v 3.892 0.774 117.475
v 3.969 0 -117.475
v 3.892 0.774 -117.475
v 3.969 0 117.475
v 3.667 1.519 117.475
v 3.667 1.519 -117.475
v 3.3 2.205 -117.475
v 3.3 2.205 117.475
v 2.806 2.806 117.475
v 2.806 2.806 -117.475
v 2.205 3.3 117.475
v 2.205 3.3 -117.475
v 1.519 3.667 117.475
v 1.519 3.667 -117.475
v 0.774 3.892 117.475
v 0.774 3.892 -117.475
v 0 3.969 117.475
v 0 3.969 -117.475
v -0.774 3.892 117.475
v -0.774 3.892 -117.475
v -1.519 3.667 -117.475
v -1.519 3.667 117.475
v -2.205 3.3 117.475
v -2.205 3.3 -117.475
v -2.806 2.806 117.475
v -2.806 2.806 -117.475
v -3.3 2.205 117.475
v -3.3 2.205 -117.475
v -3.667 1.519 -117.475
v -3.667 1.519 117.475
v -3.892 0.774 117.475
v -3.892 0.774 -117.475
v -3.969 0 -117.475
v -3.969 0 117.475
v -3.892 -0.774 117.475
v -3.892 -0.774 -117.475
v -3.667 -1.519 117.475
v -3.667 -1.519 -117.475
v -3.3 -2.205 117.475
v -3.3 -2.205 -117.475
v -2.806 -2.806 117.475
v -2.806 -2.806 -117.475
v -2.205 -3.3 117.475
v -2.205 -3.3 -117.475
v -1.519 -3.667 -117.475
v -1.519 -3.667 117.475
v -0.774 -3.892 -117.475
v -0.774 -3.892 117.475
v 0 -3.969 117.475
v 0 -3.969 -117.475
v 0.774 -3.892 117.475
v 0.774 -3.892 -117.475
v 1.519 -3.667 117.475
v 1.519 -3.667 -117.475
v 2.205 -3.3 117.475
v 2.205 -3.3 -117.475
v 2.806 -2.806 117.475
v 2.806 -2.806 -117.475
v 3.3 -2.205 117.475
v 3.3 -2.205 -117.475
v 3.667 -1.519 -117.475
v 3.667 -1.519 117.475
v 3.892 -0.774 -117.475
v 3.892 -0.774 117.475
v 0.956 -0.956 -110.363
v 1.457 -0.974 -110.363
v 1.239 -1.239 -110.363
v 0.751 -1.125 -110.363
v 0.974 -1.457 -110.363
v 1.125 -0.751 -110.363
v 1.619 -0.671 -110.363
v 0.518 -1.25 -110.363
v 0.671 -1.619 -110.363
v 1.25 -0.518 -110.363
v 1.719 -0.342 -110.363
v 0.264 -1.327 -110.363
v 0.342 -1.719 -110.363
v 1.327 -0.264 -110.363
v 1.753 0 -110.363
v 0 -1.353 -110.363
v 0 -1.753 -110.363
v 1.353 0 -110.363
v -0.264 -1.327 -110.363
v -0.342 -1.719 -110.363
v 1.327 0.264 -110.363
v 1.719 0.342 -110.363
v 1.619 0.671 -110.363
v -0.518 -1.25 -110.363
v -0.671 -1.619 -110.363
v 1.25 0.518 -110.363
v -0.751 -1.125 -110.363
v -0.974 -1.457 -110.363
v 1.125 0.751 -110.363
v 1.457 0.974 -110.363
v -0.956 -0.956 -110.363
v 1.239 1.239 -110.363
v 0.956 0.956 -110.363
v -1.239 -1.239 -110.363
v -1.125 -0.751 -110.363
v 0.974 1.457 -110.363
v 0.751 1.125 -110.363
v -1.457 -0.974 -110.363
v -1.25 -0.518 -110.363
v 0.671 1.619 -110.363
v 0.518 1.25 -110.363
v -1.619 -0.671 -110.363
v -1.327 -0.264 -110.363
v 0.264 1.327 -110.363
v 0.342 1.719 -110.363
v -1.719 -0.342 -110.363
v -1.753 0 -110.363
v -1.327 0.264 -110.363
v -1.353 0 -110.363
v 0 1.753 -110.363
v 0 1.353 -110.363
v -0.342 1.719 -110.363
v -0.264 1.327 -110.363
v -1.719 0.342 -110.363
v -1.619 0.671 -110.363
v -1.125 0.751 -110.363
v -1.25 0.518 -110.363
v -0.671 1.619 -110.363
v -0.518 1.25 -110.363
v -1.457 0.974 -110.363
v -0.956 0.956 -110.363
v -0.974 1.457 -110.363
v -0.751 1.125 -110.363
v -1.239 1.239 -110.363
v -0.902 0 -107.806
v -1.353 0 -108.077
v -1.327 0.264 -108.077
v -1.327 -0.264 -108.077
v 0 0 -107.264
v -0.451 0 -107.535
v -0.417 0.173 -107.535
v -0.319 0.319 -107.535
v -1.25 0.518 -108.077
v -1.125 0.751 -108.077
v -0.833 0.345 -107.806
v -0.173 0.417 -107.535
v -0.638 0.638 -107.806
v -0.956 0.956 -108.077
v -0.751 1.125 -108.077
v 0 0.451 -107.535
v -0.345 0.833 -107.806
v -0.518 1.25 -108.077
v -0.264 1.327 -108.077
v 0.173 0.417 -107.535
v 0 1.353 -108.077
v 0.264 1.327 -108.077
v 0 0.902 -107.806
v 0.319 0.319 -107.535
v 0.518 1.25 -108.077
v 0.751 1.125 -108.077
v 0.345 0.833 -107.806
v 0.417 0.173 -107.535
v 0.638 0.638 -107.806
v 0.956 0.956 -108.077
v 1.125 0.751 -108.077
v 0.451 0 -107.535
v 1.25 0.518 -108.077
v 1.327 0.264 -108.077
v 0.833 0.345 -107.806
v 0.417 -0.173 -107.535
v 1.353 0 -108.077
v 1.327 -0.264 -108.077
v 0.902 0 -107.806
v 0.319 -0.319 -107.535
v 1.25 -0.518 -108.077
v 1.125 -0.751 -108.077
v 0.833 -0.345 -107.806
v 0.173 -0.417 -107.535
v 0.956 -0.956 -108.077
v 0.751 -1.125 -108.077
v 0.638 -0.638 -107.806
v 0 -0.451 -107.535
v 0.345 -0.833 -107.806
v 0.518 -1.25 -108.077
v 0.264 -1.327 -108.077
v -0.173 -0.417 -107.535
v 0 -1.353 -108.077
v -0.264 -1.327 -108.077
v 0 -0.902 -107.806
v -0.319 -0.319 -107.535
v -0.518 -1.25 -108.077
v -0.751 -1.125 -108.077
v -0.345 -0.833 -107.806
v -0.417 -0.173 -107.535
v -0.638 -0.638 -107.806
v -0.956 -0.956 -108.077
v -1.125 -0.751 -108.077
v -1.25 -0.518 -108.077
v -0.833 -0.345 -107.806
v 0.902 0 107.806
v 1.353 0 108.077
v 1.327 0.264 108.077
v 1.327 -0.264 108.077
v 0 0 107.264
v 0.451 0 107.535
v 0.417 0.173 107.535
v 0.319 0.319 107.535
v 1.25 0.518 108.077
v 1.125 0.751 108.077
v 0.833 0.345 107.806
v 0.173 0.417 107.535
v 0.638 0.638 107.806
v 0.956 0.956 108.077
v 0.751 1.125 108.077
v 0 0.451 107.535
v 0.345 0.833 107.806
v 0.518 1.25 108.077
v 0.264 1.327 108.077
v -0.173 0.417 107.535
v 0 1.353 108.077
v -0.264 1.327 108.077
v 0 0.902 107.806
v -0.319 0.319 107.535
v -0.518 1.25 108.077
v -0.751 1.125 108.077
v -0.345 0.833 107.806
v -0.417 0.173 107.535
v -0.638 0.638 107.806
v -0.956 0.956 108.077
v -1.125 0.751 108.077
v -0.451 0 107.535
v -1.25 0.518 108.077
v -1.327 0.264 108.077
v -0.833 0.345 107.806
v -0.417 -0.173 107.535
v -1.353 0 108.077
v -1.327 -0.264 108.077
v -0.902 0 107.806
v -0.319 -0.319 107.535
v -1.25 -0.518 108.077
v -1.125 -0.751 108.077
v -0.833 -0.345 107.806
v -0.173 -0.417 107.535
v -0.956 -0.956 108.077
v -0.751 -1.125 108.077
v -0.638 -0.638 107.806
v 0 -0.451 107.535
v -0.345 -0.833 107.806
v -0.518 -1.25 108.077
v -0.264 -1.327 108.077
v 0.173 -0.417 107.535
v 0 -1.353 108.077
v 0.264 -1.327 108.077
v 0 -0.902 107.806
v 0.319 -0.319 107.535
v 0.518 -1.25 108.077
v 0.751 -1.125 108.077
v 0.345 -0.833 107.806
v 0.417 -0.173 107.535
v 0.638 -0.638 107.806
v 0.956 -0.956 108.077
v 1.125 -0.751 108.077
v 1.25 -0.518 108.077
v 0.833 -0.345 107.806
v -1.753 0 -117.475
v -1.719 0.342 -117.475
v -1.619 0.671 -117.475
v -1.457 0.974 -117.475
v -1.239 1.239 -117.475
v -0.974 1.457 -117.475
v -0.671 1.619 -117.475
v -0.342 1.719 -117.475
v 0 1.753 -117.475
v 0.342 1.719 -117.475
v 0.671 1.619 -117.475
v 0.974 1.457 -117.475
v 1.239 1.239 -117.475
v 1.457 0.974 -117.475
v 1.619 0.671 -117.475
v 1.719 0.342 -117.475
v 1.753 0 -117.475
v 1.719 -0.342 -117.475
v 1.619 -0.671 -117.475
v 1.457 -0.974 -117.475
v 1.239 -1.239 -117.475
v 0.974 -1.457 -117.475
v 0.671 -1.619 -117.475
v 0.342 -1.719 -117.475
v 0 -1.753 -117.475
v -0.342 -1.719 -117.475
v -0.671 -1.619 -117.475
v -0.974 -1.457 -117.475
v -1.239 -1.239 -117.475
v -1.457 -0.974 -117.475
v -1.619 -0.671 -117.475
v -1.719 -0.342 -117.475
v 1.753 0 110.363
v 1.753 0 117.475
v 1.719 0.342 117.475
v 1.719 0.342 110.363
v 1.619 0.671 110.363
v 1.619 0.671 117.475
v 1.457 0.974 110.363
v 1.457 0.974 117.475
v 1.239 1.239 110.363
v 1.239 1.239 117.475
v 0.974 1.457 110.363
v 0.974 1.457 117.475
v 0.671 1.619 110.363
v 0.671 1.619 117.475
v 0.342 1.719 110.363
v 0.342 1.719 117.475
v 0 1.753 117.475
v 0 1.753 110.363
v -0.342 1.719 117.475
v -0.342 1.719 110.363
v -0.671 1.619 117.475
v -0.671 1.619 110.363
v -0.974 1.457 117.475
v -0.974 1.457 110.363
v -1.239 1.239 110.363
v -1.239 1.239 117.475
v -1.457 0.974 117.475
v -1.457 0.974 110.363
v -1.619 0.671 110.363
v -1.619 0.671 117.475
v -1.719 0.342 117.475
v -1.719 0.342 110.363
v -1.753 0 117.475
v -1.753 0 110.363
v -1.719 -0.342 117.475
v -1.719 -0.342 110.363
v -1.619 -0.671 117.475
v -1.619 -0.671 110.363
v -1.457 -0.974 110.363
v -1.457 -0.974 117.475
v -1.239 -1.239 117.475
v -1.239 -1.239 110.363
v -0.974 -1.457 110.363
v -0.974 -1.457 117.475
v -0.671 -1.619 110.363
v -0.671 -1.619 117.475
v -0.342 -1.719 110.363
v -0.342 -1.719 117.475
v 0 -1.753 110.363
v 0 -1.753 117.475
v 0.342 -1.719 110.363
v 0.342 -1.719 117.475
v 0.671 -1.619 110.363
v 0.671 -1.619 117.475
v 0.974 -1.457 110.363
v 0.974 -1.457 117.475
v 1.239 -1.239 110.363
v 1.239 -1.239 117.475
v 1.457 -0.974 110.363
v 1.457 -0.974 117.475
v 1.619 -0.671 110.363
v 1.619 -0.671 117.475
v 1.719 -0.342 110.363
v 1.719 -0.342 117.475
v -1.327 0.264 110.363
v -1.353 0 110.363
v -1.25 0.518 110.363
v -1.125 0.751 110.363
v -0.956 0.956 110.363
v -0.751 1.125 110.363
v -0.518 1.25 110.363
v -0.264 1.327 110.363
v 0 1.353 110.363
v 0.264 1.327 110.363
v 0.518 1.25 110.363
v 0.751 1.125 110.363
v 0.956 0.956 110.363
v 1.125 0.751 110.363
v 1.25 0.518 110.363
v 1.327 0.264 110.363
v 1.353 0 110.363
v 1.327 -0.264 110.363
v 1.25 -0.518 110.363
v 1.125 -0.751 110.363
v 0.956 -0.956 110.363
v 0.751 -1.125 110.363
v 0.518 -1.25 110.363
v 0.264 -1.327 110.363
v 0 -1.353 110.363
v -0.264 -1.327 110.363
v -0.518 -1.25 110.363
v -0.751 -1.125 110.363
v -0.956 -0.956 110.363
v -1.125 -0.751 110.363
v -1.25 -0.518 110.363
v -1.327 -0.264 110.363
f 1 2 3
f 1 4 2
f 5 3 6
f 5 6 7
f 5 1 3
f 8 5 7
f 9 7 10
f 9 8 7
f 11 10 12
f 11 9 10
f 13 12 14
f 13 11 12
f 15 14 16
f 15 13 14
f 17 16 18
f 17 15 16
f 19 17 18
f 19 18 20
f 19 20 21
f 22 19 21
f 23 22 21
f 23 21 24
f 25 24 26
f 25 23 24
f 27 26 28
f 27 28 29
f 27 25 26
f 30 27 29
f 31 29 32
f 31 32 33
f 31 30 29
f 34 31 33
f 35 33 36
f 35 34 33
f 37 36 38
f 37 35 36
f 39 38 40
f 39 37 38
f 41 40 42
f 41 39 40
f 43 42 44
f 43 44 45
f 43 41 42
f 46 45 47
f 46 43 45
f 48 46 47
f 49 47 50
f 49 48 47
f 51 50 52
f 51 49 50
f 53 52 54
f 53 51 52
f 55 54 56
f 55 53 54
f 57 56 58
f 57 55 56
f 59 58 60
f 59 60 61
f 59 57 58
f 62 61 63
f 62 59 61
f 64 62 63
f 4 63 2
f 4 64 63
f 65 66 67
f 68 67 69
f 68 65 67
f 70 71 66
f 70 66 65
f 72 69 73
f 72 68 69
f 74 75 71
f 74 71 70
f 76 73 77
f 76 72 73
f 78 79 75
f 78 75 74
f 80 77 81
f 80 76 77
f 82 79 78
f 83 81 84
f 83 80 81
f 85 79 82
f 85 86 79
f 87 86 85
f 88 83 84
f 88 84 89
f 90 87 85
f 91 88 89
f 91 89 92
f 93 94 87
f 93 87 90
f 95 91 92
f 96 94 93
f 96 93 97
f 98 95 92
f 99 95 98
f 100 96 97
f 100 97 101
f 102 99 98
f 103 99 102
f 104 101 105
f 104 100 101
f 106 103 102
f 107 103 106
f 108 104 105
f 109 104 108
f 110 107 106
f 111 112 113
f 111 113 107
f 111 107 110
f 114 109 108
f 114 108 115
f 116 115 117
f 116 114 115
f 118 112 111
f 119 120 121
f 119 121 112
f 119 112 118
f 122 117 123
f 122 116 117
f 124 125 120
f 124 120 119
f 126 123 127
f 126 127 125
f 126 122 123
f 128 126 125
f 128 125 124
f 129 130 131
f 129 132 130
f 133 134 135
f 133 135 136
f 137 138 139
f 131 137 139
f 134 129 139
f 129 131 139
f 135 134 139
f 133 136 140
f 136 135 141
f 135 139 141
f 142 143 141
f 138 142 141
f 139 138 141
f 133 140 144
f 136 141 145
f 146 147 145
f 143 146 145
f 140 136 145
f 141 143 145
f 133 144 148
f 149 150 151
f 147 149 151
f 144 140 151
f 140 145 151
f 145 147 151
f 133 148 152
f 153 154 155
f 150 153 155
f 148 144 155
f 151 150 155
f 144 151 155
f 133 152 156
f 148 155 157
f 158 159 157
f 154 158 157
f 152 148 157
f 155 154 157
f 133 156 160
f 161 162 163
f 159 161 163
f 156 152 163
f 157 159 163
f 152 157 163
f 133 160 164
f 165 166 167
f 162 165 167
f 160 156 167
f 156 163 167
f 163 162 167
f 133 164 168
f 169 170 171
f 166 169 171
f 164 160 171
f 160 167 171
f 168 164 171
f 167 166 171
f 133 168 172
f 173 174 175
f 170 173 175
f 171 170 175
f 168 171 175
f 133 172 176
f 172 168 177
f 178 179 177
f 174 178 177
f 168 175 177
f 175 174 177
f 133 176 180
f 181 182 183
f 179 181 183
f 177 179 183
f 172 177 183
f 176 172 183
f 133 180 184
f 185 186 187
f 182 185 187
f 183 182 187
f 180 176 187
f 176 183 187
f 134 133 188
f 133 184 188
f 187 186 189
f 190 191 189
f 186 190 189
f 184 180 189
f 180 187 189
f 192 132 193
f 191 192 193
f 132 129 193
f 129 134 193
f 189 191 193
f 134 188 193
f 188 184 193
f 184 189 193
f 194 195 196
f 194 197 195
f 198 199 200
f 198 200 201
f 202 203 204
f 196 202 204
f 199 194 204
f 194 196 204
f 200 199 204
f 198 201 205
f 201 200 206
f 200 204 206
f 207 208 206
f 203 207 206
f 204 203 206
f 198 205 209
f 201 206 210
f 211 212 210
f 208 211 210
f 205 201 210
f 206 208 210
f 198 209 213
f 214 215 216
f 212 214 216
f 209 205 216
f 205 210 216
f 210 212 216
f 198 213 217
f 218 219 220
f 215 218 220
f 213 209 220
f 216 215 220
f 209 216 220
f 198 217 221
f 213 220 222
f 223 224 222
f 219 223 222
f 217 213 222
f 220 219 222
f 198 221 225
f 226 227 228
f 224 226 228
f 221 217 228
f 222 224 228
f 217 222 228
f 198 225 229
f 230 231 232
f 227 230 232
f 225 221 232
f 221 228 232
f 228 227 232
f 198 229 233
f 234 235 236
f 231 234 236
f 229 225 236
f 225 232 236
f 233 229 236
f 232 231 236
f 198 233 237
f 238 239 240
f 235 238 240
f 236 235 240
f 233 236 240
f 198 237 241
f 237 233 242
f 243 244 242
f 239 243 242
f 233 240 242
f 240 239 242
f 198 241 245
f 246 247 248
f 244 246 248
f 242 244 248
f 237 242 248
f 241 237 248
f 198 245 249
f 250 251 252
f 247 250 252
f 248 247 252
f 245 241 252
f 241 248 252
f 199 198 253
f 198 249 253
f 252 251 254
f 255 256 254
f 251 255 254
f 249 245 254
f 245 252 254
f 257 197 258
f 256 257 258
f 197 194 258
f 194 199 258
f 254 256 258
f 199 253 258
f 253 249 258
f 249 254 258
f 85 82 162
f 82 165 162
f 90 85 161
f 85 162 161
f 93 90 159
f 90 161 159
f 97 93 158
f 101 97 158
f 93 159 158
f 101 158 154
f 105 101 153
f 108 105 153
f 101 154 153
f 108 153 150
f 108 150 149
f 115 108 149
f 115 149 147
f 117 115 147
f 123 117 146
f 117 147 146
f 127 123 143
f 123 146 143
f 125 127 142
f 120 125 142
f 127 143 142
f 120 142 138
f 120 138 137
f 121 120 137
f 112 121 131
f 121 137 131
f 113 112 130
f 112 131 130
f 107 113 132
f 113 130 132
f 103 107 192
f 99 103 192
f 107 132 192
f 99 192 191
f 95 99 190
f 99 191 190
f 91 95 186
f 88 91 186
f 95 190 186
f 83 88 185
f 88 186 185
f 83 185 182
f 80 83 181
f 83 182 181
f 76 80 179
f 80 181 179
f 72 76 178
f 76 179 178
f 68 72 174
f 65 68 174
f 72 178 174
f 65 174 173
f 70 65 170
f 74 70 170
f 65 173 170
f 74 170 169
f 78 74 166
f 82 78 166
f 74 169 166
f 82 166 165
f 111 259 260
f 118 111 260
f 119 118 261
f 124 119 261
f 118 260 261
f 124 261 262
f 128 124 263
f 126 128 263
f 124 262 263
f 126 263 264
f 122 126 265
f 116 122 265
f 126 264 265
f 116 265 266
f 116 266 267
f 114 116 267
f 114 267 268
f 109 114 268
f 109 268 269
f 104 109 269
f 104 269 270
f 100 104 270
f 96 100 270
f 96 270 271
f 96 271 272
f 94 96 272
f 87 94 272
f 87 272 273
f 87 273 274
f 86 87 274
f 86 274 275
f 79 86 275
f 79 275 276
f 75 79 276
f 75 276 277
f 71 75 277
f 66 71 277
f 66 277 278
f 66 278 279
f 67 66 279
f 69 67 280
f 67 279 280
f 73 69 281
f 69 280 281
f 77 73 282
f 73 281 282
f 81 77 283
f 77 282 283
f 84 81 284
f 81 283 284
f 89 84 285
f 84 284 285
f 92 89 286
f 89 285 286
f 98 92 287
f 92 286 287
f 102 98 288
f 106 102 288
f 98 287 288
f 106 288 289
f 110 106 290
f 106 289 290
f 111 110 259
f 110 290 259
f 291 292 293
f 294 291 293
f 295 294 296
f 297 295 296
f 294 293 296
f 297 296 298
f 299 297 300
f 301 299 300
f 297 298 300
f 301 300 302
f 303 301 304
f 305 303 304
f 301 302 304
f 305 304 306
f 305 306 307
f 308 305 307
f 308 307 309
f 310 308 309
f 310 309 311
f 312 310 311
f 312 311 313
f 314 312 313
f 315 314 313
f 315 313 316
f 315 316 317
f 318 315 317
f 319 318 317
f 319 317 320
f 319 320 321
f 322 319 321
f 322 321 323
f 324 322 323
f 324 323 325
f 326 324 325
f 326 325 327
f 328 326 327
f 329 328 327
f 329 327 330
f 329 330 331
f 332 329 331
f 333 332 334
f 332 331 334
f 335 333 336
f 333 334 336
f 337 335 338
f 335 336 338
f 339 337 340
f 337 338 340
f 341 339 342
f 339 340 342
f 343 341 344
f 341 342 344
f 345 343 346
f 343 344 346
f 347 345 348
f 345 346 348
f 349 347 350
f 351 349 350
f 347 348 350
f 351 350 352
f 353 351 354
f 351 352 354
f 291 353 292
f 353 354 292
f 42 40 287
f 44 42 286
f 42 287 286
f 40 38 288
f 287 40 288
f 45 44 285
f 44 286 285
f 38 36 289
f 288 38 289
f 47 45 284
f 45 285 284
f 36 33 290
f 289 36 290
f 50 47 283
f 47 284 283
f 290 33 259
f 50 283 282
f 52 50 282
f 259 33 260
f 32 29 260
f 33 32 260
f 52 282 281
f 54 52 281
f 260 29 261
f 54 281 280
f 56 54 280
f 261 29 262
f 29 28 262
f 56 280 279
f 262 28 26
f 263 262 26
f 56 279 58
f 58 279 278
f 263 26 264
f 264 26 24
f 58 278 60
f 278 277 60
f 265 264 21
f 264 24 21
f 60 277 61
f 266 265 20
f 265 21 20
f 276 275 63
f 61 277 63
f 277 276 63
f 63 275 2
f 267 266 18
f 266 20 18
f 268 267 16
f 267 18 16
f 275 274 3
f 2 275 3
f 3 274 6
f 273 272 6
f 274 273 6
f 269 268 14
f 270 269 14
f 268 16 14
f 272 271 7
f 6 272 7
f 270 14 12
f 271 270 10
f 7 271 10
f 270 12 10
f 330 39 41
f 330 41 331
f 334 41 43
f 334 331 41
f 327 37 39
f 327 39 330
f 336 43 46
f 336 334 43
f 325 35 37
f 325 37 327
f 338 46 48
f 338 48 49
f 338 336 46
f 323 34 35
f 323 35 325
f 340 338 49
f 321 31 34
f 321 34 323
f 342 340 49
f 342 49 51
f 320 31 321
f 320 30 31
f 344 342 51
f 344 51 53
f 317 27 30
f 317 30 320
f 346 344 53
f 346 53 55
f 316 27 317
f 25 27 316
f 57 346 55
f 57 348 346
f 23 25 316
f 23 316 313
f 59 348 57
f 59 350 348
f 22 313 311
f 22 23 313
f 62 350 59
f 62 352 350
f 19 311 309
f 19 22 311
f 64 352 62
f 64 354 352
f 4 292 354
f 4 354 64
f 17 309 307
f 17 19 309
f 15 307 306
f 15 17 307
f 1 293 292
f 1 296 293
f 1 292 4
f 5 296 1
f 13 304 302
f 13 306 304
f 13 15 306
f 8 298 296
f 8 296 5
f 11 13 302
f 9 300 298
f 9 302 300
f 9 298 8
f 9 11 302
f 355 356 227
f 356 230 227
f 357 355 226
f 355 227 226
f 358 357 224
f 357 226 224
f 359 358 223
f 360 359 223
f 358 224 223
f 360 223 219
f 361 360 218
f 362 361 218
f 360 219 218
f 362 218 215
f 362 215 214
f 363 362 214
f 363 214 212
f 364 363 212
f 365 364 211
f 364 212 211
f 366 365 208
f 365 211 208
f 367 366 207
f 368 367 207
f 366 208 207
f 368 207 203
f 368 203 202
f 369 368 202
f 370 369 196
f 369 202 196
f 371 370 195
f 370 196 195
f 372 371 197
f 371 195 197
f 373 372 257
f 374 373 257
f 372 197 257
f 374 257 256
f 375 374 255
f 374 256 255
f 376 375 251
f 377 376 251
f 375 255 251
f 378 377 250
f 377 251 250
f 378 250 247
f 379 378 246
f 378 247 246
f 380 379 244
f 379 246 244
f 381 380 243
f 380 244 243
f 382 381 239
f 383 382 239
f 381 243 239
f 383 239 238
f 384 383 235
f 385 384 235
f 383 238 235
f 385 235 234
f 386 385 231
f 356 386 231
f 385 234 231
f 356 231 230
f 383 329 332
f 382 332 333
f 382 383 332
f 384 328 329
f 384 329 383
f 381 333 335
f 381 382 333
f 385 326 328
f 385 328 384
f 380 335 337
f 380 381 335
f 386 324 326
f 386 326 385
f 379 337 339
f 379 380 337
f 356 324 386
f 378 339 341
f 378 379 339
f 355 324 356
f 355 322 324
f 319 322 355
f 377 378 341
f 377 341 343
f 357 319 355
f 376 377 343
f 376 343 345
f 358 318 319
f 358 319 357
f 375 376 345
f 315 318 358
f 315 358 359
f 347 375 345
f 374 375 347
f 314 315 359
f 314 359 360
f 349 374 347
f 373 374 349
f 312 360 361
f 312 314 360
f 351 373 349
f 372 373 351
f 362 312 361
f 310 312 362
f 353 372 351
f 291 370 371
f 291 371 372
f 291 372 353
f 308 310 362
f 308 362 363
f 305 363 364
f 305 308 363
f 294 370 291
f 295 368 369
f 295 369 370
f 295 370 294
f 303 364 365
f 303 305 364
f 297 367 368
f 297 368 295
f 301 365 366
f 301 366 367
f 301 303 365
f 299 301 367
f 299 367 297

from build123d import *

# Parameters (mm, degrees)
SKETCH1_R                       = 3.96875
BOSS_EXTRUDE1_DEPTH             = 117.475
F_6_32_TAPPED_HOLE1_D           = 2.7051
F_6_32_TAPPED_HOLE1_DEPTH       = 9.398
F_6_32_TAPPED_HOLE1_CBORE_D     = 3.5052
F_6_32_TAPPED_HOLE1_CBORE_DEPTH = 7.112
F_6_32_TAPPED_HOLE1_TIP         = 0.81269403
F_6_32_TAPPED_HOLE2_D           = 2.7051
F_6_32_TAPPED_HOLE2_DEPTH       = 9.398
F_6_32_TAPPED_HOLE2_CBORE_D     = 3.5052
F_6_32_TAPPED_HOLE2_CBORE_DEPTH = 7.112
F_6_32_TAPPED_HOLE2_TIP         = 0.81269403


with BuildPart() as part:
    # Sketch1 → Boss-Extrude1 (new, symmetric)
    with BuildSketch(Plane.XY):
        Circle(SKETCH1_R)
    extrude(amount=BOSS_EXTRUDE1_DEPTH, both=True)

    # #6-32 Tapped Hole1
    with Locations(Plane(origin=(0, 0, -117.475), x_dir=(-1, 0, 0), z_dir=(0, 0, -1))):
        with Locations((0, 0)):
            CounterBoreHole(F_6_32_TAPPED_HOLE1_D / 2, F_6_32_TAPPED_HOLE1_CBORE_D / 2, F_6_32_TAPPED_HOLE1_CBORE_DEPTH, depth=F_6_32_TAPPED_HOLE1_DEPTH)
            with Locations((0, 0, -(F_6_32_TAPPED_HOLE1_DEPTH + F_6_32_TAPPED_HOLE1_TIP / 2))):  # 118° drill point
                Cone(0, F_6_32_TAPPED_HOLE1_D / 2, F_6_32_TAPPED_HOLE1_TIP, mode=Mode.SUBTRACT)

    # #6-32 Tapped Hole2
    with Locations(Plane.XY.offset(117.475)):
        with Locations((0, 0)):
            CounterBoreHole(F_6_32_TAPPED_HOLE2_D / 2, F_6_32_TAPPED_HOLE2_CBORE_D / 2, F_6_32_TAPPED_HOLE2_CBORE_DEPTH, depth=F_6_32_TAPPED_HOLE2_DEPTH)
            with Locations((0, 0, -(F_6_32_TAPPED_HOLE2_DEPTH + F_6_32_TAPPED_HOLE2_TIP / 2))):  # 118° drill point
                Cone(0, F_6_32_TAPPED_HOLE2_D / 2, F_6_32_TAPPED_HOLE2_TIP, mode=Mode.SUBTRACT)


solid = part.part
